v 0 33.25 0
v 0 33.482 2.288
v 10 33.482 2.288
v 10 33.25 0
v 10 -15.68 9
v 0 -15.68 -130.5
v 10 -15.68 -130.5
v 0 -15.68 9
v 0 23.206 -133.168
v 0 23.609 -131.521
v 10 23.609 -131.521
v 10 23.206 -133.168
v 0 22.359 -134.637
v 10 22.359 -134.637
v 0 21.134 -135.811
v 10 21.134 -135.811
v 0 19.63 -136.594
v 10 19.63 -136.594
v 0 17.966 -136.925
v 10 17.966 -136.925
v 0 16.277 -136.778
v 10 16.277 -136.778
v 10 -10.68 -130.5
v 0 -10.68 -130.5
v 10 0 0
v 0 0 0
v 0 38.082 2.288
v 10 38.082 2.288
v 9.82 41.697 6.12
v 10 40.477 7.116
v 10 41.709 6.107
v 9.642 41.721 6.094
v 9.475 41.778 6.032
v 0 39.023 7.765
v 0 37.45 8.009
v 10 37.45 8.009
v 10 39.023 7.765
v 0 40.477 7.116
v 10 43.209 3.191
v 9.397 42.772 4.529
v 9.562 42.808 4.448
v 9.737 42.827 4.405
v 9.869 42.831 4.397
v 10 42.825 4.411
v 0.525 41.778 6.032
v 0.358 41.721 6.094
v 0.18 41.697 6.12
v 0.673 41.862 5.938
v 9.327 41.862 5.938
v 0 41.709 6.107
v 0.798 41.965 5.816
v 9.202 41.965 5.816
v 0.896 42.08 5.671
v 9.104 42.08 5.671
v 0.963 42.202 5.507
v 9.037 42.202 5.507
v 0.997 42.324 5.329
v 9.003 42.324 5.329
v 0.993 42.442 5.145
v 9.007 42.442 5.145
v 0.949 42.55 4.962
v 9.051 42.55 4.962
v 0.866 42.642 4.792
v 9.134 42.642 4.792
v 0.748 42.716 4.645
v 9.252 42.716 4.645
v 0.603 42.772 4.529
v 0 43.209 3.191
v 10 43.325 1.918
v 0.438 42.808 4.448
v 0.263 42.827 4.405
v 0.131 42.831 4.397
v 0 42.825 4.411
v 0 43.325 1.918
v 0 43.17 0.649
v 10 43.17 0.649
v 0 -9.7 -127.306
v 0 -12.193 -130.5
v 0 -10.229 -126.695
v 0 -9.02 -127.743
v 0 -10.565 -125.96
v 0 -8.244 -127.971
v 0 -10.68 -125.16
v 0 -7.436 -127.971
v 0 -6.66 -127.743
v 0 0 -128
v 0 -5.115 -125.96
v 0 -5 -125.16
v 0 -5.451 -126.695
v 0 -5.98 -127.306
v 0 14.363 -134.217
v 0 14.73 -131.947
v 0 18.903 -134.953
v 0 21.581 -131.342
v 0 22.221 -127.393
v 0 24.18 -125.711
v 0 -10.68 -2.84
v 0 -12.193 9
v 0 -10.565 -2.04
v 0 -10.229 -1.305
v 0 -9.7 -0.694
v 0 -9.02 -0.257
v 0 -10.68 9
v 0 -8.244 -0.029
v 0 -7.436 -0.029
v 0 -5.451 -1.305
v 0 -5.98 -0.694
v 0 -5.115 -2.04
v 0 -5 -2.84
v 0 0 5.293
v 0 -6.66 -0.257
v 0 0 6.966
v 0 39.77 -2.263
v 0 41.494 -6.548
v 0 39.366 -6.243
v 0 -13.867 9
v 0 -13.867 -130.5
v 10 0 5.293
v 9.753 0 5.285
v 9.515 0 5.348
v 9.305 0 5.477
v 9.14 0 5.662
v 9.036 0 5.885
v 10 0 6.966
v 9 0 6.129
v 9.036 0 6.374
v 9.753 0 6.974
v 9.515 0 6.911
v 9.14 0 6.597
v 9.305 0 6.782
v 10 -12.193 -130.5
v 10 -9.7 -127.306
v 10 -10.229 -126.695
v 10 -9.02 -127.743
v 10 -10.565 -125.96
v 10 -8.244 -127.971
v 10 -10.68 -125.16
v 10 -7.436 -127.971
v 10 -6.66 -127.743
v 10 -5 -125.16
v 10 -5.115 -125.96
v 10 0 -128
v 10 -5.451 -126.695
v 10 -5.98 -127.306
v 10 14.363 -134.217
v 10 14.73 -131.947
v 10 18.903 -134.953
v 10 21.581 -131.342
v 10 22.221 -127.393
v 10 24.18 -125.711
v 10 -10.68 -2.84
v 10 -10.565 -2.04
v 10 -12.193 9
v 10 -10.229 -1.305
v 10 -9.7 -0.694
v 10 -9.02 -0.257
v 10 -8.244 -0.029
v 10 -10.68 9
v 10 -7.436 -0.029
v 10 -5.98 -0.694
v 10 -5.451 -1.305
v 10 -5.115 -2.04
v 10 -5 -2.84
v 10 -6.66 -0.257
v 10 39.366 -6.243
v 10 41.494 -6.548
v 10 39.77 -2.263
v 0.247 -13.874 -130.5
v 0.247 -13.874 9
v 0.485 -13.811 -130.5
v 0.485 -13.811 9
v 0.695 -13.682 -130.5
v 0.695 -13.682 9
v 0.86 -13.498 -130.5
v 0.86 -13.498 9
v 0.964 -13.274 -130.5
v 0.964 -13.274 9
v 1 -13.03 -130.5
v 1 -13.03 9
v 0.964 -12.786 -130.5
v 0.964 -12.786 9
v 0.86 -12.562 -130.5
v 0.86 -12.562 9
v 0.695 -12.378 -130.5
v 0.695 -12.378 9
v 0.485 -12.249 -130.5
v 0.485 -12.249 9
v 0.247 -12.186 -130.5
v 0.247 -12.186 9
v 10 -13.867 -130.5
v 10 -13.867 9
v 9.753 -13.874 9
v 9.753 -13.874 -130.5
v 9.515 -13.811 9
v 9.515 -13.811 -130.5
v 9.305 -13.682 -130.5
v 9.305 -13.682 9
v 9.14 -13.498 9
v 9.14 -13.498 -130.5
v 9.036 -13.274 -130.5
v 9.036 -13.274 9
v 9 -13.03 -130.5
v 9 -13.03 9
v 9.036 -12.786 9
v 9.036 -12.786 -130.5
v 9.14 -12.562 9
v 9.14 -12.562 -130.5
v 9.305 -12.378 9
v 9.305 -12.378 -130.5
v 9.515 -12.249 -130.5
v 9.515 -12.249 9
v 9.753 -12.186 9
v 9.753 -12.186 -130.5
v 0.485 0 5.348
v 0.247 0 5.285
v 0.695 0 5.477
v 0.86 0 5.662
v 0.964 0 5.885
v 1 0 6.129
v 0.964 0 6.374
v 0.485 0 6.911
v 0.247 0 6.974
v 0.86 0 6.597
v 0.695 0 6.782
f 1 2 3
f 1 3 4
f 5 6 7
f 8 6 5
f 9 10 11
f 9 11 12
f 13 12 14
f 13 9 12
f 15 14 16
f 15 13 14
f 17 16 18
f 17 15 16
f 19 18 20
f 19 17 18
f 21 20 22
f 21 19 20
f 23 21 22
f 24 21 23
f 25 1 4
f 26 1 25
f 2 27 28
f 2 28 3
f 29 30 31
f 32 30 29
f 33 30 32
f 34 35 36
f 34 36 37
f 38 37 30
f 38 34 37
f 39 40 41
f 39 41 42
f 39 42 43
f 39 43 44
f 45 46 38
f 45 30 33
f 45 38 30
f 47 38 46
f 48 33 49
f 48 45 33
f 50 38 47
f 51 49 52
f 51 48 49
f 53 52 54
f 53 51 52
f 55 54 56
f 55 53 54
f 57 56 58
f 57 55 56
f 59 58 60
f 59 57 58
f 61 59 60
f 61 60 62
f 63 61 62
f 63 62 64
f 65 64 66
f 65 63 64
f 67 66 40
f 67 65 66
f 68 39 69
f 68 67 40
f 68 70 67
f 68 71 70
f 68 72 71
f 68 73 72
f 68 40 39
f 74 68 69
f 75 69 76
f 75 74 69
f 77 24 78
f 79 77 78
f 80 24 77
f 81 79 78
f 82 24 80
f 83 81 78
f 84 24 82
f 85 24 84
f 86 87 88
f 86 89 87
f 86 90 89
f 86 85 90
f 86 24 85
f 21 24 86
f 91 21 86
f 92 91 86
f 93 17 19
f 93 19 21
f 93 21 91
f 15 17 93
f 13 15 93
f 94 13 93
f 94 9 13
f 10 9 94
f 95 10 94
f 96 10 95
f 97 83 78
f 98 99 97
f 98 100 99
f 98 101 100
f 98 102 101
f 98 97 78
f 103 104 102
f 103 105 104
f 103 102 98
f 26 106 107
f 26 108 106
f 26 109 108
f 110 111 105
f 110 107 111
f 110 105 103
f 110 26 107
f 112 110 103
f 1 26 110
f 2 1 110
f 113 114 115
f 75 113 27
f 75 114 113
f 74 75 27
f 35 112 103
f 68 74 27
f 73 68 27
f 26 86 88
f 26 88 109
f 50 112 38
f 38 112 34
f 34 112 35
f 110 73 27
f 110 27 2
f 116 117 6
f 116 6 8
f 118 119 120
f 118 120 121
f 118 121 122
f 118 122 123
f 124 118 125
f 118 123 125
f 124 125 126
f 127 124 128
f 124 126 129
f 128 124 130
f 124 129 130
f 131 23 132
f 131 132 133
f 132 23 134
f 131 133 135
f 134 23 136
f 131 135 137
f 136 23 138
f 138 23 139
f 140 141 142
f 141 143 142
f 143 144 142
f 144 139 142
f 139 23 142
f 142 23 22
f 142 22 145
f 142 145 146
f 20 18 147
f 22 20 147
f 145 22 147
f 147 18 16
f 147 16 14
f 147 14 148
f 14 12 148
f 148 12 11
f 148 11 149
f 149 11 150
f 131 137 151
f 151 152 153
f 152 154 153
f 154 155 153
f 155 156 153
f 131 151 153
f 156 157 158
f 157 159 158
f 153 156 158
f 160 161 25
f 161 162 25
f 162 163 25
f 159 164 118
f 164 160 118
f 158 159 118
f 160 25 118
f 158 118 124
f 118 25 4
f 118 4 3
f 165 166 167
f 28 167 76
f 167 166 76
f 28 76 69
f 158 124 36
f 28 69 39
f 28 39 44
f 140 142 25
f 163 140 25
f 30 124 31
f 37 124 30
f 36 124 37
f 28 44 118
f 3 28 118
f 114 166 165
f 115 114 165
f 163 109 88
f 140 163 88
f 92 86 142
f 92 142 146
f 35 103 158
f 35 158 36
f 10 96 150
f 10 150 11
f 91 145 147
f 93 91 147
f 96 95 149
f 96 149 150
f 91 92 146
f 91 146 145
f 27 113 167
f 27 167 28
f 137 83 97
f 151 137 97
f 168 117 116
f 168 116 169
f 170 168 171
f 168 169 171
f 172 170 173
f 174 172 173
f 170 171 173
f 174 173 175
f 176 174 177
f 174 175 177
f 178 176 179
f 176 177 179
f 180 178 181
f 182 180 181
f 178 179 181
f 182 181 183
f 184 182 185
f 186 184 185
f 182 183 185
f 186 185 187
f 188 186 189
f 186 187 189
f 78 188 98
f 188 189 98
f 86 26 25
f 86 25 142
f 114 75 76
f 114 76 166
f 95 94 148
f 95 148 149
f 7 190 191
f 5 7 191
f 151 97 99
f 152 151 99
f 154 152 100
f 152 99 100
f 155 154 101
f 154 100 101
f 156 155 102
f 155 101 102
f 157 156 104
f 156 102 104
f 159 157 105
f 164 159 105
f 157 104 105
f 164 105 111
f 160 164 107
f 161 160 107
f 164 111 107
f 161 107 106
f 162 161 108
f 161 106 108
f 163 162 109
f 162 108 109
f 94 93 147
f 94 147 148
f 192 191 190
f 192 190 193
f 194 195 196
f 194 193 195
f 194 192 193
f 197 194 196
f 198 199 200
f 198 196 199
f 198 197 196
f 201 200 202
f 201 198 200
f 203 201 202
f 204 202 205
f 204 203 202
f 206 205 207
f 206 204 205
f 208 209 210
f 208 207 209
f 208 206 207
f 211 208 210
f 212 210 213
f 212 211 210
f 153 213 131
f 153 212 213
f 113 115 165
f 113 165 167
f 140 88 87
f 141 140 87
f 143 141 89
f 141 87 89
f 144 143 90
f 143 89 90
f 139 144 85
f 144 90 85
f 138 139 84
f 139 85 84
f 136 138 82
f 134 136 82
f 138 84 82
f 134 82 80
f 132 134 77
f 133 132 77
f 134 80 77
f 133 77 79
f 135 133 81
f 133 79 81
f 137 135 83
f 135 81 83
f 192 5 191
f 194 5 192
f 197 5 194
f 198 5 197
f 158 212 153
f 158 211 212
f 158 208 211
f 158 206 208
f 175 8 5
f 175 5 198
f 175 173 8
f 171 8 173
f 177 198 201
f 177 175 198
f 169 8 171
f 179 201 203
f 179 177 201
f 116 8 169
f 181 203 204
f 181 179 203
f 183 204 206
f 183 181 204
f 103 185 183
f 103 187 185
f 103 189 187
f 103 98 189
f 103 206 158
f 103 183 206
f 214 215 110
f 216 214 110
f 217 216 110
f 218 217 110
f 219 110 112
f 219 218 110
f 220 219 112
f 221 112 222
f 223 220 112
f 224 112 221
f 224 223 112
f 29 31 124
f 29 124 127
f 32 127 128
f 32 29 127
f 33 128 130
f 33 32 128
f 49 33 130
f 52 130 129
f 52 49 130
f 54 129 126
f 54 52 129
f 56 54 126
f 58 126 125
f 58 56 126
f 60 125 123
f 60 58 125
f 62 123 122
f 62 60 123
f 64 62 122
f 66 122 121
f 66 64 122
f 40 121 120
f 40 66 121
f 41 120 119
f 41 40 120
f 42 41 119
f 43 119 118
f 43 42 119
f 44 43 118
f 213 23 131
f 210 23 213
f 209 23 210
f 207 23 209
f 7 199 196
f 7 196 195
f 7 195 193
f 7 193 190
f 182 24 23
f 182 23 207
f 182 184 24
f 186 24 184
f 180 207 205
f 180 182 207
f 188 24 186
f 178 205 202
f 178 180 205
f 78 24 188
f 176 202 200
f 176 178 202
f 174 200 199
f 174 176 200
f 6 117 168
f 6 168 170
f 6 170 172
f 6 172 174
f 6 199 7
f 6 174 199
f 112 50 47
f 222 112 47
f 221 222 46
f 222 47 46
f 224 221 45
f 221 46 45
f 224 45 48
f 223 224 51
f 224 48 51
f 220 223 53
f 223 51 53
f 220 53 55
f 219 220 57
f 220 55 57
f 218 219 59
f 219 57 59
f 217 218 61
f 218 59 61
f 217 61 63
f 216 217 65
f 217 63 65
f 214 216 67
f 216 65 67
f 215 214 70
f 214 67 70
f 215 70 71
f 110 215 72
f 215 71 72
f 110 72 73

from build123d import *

# Parameters (mm, degrees)
BOSS_EXTRUDE1_DEPTH = 10
CUT_EXTRUDE4_REACH  = 150.602
CUT_EXTRUDE5_DEPTH  = 144.972857609


with BuildPart() as part:
    # Sketch1 → Boss-Extrude1 (new body)
    with BuildSketch(Plane(origin=(0, 0, 0), x_dir=(0, 0, -1), z_dir=(1, 0, 0))):
        with BuildLine():
            Line((0, 0), (128, 0))
            Line((128, 0), (131.946990438, 14.730368851))
            Line((131.946990438, 14.730368851), (134.217403847, 14.362642119))
            Line((134.217403847, 14.362642119), (134.952857311, 18.903468939))
            Line((134.952857311, 18.903468939), (131.341565092, 21.580990302))
            Line((131.341565092, 21.580990302), (127.393020031, 22.220515053))
            Line((127.393020031, 22.220515053), (125.710603817, 24.179837998))
            Line((125.710603817, 24.179837998), (131.520951621, 23.60910455))
            ThreePointArc((131.520951621, 23.60910455), (135.810577018, 21.133985308), (136.778030397, 16.276914661))
            Line((136.778030397, 16.276914661), (130.5, -10.68))
            Line((130.5, -10.68), (130.5, -15.68))
            Line((130.5, -15.68), (-9, -15.68))
            Line((-9, -15.68), (-9, -10.68))
            Line((-9, -10.68), (-8.008635101, 37.449655704))
            ThreePointArc((-8.008635101, 37.449655704), (-5.691899097, 42.063492927), (-0.648979735, 43.169713494))
            Line((-0.648979735, 43.169713494), (6.548278337, 41.493534839))
            Line((6.548278337, 41.493534839), (6.242876448, 39.365871735))
            Line((6.242876448, 39.365871735), (2.263353613, 39.770096924))
            Line((2.263353613, 39.770096924), (-2.28822563, 38.082429484))
            Line((-2.28822563, 38.082429484), (-2.28822563, 33.482429484))
            Line((-2.28822563, 33.482429484), (0, 33.25))
            Line((0, 33.25), (0, 0))
        make_face()
        with BuildLine():
            Line((2.84, -5), (125.16, -5))
            ThreePointArc((125.16, -5), (128, -7.84), (125.16, -10.68))
            Line((125.16, -10.68), (2.84, -10.68))
            ThreePointArc((2.84, -10.68), (0, -7.84), (2.84, -5))
        make_face(mode=Mode.SUBTRACT)
    extrude(amount=BOSS_EXTRUDE1_DEPTH)

    # Cut-Extrude4: up to this plane
    cut_extrude4_end = Plane(origin=(0, 0, 0), z_dir=(0, 1, 0))
    # Sketch2 → Cut-Extrude4 (cut, up to the surface)
    with BuildSketch(Plane(origin=(0, 43.267611016, -0.891217487), x_dir=(1, 0, 0), z_dir=(0, 0.9997879328481811, -0.020593429320073266)), mode=Mode.PRIVATE) as cut_extrude4_sk1:
        with BuildLine():
            Line((0, -5.291493544), (0, -6.964813597))
            ThreePointArc((0, -6.964813597), (1, -6.12815357), (0, -5.291493544))
        make_face()
    cut_extrude4_tool1 = split(extrude(cut_extrude4_sk1.sketch, amount=-CUT_EXTRUDE4_REACH, mode=Mode.PRIVATE), bisect_by=cut_extrude4_end, keep=Keep.BOTH, mode=Mode.PRIVATE)
    cut_extrude4 = cut_extrude4_tool1.solids().sort_by_distance((0.431182, 43.393811, 5.235637))[0]
    add(cut_extrude4, mode=Mode.SUBTRACT)

    # Mirror1: Cut-Extrude4 across plane
    add(cut_extrude4.mirror(Plane(origin=(5, 0, 0), x_dir=(0, 0, 1), z_dir=(1, 0, 0))), mode=Mode.SUBTRACT)

    # Sketch3 → Cut-Extrude5 (cut, symmetric)
    with BuildSketch(Plane.XY):
        with BuildLine():
            ThreePointArc((0, -13.866660027), (1, -13.03), (0, -12.193339973))
            Line((0, -12.193339973), (0, -13.866660027))
        make_face()
    cut_extrude5 = extrude(amount=CUT_EXTRUDE5_DEPTH, both=True, mode=Mode.SUBTRACT)

    # Mirror2: Cut-Extrude5 across plane
    add(cut_extrude5.mirror(Plane(origin=(5, 0, 0), x_dir=(0, 0, 1), z_dir=(1, 0, 0))), mode=Mode.SUBTRACT)


solid = part.part
